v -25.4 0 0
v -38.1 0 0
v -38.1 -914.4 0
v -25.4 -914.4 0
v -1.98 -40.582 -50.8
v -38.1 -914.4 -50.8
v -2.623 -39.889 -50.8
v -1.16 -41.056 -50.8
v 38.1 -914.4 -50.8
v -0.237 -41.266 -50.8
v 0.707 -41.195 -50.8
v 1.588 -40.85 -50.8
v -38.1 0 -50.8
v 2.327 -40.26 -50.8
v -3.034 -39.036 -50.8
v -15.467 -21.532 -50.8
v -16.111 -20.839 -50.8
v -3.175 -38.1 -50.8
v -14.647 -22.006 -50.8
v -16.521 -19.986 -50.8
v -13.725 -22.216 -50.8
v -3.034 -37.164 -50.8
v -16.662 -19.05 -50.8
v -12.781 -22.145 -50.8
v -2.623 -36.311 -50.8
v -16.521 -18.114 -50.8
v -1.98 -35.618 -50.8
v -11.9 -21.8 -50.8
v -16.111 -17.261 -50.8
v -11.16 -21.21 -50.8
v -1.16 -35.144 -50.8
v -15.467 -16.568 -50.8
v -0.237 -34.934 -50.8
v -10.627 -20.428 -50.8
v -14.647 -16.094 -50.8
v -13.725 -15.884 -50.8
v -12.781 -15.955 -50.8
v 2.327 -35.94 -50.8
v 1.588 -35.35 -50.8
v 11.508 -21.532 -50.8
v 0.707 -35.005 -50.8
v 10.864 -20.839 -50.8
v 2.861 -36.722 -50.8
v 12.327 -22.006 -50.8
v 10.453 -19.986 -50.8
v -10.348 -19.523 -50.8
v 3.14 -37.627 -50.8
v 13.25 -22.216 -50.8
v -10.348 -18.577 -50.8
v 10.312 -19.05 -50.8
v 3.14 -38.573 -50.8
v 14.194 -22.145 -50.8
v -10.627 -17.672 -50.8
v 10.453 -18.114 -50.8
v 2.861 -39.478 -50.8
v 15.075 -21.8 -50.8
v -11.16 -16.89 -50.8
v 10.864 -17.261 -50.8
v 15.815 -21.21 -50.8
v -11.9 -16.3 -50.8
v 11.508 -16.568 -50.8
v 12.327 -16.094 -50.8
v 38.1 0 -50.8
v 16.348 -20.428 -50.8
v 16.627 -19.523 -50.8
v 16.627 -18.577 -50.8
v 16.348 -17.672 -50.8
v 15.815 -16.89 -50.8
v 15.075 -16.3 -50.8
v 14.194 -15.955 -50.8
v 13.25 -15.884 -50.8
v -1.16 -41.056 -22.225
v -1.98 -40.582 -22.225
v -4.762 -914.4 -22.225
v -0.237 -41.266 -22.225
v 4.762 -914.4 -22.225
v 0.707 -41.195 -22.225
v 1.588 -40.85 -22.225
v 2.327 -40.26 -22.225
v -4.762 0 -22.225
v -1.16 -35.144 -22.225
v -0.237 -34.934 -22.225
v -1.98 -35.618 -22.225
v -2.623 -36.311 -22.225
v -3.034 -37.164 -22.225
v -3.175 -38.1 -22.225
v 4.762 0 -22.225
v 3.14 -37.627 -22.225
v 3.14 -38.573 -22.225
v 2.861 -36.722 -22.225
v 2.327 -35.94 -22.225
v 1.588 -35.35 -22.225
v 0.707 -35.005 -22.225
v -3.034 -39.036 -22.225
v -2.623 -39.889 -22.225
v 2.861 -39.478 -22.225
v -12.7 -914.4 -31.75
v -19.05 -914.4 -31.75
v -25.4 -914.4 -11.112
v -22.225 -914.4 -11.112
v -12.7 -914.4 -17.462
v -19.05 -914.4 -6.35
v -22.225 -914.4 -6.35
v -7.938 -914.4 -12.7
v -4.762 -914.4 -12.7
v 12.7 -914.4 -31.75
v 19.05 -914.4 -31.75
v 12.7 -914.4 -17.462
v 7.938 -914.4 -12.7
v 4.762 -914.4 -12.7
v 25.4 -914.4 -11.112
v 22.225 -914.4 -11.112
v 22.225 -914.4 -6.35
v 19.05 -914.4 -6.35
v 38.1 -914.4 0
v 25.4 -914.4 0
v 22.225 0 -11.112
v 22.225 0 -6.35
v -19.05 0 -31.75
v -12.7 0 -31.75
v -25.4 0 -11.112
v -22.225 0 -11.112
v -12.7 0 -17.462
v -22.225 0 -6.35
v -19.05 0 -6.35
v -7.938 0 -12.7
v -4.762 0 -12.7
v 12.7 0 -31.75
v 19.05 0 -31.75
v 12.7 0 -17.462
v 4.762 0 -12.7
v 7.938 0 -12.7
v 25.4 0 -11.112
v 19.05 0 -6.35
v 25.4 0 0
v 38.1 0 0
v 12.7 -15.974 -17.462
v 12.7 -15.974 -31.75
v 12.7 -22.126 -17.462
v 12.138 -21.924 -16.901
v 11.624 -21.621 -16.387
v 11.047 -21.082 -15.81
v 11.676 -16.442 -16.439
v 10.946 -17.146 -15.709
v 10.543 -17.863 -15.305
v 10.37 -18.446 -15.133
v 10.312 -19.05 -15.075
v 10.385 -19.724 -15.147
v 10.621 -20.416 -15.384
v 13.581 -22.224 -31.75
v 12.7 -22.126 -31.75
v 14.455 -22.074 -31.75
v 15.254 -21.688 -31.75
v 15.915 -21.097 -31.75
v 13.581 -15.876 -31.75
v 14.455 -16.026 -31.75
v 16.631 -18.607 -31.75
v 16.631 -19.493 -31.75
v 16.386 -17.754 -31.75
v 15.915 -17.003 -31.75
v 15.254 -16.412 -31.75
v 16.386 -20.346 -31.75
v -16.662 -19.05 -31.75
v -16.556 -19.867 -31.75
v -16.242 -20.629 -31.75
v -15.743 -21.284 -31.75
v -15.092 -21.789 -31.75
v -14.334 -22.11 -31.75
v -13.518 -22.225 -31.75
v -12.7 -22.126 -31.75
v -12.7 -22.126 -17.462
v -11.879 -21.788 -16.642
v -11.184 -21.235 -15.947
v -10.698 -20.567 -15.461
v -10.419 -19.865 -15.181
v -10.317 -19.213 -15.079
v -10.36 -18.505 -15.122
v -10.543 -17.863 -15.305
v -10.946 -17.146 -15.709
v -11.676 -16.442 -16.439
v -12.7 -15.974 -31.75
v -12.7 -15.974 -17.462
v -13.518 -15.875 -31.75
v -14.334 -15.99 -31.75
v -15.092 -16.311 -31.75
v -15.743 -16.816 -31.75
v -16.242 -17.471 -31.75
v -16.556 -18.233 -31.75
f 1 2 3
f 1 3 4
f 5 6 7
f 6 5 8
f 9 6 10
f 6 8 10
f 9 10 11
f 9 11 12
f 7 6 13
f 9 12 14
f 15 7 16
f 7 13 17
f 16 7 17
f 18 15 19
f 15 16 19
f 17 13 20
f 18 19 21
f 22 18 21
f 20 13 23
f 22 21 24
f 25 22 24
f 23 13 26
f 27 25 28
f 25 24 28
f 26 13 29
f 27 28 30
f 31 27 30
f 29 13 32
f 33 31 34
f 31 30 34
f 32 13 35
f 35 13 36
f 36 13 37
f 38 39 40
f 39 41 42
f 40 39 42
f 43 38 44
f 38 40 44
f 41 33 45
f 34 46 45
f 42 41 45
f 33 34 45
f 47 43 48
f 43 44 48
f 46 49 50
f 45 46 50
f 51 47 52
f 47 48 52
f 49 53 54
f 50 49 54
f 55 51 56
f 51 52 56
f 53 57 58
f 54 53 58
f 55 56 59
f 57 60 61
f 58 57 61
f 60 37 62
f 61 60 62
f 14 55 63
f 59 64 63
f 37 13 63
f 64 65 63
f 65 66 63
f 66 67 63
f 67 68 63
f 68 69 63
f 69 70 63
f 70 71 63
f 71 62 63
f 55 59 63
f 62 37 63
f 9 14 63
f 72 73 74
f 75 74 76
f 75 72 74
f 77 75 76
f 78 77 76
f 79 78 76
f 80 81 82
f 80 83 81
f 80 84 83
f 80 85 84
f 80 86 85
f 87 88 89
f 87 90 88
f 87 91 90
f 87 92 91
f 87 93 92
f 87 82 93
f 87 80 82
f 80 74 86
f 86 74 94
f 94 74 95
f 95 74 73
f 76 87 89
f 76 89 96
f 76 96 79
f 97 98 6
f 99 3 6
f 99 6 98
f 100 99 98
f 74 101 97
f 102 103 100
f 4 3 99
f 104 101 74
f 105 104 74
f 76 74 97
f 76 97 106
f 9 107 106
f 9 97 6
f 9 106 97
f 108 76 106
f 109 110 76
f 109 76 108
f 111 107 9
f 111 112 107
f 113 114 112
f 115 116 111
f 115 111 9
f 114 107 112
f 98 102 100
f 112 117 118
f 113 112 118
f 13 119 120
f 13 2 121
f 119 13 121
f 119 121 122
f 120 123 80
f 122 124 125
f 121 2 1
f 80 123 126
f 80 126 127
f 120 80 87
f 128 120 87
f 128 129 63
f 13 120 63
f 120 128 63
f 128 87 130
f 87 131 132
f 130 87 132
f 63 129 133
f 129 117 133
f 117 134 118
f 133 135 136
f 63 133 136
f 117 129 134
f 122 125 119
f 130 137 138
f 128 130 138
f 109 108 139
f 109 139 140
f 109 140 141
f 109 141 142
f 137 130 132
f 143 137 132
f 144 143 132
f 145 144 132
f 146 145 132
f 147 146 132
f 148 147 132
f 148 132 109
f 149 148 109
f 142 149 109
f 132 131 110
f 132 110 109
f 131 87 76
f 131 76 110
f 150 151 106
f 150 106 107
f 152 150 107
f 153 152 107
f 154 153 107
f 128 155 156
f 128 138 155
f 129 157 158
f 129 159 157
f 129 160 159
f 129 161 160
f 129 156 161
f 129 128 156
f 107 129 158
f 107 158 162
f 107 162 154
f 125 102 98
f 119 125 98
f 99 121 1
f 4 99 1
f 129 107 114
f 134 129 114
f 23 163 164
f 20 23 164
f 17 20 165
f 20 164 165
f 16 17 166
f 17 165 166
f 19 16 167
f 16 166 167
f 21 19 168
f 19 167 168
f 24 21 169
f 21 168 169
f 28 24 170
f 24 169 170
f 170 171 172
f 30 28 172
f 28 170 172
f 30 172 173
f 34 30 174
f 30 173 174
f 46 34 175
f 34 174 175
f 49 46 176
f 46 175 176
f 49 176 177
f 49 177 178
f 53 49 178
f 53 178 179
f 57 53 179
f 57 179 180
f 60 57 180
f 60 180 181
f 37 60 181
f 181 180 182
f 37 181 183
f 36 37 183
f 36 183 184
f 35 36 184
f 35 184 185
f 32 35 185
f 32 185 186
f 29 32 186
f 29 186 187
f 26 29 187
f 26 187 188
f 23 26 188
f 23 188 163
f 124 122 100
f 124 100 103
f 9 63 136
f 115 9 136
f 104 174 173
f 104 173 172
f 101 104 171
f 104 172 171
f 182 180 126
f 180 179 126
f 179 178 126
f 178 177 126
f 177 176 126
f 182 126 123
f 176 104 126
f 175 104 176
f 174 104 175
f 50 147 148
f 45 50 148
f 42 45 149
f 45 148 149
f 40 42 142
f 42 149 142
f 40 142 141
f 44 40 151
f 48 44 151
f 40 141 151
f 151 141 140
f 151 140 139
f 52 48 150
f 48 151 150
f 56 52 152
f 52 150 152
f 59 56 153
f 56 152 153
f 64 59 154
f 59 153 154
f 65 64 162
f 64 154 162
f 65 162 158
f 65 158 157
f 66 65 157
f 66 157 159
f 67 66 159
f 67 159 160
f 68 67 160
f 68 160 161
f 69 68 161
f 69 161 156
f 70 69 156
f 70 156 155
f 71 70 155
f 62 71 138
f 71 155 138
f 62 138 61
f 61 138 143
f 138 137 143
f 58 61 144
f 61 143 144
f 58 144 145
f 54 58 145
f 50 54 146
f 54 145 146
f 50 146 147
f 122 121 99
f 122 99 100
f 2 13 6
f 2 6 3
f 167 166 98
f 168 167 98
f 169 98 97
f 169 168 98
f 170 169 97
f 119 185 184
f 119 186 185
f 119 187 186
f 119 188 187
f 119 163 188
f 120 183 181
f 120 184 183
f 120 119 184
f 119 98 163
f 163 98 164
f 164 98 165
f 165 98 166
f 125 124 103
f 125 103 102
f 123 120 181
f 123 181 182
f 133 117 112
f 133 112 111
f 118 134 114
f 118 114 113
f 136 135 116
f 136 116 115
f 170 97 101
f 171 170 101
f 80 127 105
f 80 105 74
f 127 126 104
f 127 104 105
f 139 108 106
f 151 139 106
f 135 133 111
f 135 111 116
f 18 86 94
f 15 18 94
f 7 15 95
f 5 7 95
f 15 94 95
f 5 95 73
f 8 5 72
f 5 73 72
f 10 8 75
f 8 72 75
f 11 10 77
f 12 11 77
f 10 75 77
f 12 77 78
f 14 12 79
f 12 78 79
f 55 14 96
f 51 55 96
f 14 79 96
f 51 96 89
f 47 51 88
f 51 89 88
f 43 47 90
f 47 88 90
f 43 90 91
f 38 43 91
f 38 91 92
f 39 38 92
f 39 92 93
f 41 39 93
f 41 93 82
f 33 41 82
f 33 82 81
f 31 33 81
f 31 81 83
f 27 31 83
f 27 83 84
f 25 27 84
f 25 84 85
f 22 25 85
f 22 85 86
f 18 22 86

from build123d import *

# Parameters (mm, degrees)
F0_W         = 76.2
F0_H         = 50.8
F1_DEPTH     = 914.4
F2_W         = 50.8
F2_H         = 6.35
F3_DEPTH     = 914.401
F5_DEPTH     = 914.401
F6_W         = 3.175
F6_H         = 4.7625
F7_DEPTH     = 914.401
F9_D         = 6.35
F10_D        = 6.35
F11_T1_DEPTH = 916.7694673581
F11_T3_DEPTH = 40.4694673581


# Not quite as in the source:
# - a fillet or chamfer that OpenCascade refuses, or shapes differently, is made with other operations: its cross-section is extruded or revolved along the edge and cut away or added


with BuildPart() as f1:
    # F0 (on Front) → F1 (new body)
    with BuildSketch(Plane.XZ):
        with Locations((0, -25.4)):
            Rectangle(F0_W, F0_H)
    extrude(amount=F1_DEPTH)

    # F2 (on Front) → F3 (cut, through all)
    with BuildSketch(Plane.XZ):
        with Locations((0, -3.175)):
            Rectangle(F2_W, F2_H)
    extrude(amount=F3_DEPTH, mode=Mode.SUBTRACT)

    # F4 (on Front) → F5 (cut, through all)
    with BuildSketch(Plane.XZ):
        Polygon((0, -6.35), (-19.05, -6.35), (-19.05, -31.75), (-12.7, -31.75), (-12.7, -12.7), (-4.7625, -12.7), (-4.7625, -22.225), (0, -22.225), (4.7625, -22.225), (4.7625, -12.7), (12.7, -12.7), (12.7, -31.75), (19.05, -31.75), (19.05, -6.35), align=None)
    extrude(amount=F5_DEPTH, mode=Mode.SUBTRACT)

    # F6 (on Front) → F7 (cut, through all)
    with BuildSketch(Plane.XZ):
        with Locations((-23.8125, -8.73125)):
            Rectangle(F6_W, F6_H)
        with Locations((23.8125, -8.73125)):
            Rectangle(F6_W, F6_H)
    extrude(amount=F7_DEPTH, mode=Mode.SUBTRACT)

    # F9 (through all)
    with Locations(Plane(origin=(0, 0, -50.8), x_dir=(1, 0, 0), z_dir=(0, 0, -1))):
        with Locations((0, 38.1)):
            Hole(F9_D / 2)

    # F10 (through all)
    with Locations(Plane(origin=(0, 0, -50.8), x_dir=(1, 0, 0), z_dir=(0, 0, -1))):
        with Locations((-13.4874, 19.05), (13.4874, 19.05)):
            Hole(F10_D / 2)

    # F11: chamfer of 4.7625 on 4 edges, made by hand

    # F11_s2 → F11_t1 (cut)
    with BuildSketch(Plane.XZ.offset(9.8781728721)):
        Polygon((-7.9375, -12.7), (-12.7, -17.4625), (-12.7, -12.7), align=None)
        Polygon((7.9375, -12.7), (12.7, -17.4625), (12.7, -12.7), align=None)
    extrude(amount=F11_T1_DEPTH, mode=Mode.SUBTRACT)

    # F11_s4 → F11_t3 (cut)
    with BuildSketch(Plane.XZ.offset(-12.2476402302)):
        Polygon((12.7, -17.4625), (7.9375, -12.7), (12.7, -12.7), align=None)
        Polygon((-7.9375, -12.7), (-12.7, -17.4625), (-12.7, -12.7), align=None)
    extrude(amount=F11_T3_DEPTH, mode=Mode.SUBTRACT)


solid = f1.part
